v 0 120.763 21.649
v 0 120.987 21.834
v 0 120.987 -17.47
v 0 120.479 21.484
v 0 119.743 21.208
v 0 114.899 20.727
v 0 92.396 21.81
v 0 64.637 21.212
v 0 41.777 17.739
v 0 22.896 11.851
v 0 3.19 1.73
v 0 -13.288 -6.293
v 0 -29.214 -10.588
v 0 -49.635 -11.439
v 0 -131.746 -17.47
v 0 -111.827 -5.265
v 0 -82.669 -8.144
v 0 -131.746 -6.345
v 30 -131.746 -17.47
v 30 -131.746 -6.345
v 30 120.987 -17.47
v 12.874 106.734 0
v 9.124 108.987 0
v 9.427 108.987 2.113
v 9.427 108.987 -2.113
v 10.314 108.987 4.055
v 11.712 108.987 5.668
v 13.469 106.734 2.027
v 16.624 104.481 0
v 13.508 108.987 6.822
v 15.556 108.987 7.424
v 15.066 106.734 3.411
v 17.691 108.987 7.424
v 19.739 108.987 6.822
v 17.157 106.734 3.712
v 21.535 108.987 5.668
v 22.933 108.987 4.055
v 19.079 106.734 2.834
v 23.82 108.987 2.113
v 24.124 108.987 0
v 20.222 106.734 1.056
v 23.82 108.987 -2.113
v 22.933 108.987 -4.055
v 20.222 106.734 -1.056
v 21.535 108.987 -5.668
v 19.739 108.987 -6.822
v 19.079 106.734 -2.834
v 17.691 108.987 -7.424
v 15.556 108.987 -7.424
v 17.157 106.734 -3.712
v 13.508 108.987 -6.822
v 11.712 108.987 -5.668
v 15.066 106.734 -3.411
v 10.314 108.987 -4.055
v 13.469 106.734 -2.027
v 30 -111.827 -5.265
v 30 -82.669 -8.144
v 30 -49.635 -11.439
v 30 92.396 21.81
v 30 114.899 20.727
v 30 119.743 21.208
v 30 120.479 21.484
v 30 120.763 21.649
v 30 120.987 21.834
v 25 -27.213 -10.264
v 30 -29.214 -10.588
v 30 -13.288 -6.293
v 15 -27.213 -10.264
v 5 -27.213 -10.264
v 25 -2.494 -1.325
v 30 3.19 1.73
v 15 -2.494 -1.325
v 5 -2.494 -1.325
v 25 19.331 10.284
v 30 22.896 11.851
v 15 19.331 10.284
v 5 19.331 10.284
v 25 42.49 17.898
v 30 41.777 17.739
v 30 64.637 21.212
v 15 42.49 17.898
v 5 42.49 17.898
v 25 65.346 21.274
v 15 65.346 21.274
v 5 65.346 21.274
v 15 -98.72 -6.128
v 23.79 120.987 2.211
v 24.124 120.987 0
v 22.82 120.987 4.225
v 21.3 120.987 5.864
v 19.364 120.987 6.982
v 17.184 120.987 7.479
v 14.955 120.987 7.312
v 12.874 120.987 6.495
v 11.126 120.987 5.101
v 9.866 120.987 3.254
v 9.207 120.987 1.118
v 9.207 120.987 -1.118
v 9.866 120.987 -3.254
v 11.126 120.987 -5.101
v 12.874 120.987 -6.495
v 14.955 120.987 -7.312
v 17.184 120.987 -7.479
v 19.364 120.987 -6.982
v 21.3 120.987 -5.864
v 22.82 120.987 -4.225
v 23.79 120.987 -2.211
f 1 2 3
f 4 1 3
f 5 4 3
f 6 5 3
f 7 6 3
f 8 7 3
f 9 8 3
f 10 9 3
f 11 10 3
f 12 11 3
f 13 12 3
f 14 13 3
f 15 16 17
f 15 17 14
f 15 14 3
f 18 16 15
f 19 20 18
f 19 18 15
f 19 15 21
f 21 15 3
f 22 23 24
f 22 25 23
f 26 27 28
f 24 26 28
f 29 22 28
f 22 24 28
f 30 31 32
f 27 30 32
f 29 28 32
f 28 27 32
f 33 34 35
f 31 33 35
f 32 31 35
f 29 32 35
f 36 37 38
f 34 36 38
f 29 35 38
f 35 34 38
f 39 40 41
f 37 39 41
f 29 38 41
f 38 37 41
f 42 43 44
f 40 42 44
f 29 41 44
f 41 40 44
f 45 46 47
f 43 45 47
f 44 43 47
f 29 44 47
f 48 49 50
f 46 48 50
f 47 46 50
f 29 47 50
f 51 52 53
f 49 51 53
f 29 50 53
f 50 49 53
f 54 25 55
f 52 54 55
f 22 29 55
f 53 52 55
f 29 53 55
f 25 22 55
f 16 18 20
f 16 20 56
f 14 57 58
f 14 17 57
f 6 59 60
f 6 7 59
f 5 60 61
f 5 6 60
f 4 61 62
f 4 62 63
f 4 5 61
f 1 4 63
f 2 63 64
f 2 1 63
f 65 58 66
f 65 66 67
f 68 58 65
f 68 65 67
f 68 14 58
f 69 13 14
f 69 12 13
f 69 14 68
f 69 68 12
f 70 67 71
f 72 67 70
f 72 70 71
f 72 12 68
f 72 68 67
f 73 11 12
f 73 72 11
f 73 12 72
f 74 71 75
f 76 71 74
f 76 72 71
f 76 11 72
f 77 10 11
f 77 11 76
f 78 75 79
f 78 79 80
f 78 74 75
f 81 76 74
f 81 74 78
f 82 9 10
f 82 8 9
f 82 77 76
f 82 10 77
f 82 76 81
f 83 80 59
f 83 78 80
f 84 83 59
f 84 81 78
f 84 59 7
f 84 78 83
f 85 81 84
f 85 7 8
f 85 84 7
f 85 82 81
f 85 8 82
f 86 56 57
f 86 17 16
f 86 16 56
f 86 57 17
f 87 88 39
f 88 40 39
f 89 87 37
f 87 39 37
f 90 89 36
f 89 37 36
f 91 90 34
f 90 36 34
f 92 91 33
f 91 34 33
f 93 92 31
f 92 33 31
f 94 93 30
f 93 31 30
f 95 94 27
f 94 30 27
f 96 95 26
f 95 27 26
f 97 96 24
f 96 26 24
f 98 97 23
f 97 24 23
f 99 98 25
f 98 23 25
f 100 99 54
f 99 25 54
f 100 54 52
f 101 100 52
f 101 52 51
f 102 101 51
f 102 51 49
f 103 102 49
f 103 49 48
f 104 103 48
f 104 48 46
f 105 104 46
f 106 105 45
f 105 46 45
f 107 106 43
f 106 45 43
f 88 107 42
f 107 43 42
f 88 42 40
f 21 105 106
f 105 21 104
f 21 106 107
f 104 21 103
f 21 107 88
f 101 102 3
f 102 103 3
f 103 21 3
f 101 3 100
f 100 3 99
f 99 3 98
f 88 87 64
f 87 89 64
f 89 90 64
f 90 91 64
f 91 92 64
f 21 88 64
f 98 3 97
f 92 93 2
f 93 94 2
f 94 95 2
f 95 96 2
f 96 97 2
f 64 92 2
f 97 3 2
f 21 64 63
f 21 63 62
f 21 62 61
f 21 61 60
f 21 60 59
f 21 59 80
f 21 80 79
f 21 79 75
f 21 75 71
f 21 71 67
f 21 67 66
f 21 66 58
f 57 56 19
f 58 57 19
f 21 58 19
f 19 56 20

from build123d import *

# Parameters (mm, degrees)
F1_DEPTH = 30
F3_D     = 15
F3_DEPTH = 12
F3_TIP   = 4.5064546427


with BuildPart() as f1:
    # F0 (on Right) → F1 (new body)
    with BuildSketch(Plane.YZ):
        with BuildLine():
            add(Edge.make_bspline(
                [(-131.7461282015, -6.3447873108), (-123.3728835246, -5.5048995417), (-101.6398772811, -3.324945792), (-23.878808121, -20.0188151505), (17.9272379867, 14.4389849512), (65.4591264475, 22.4432346678), (95.6973111303, 22.0628570773), (119.1290489196, 19.9651290611), (120.9872886539, 21.8335315585)],
                knots=[0, 0, 0, 0, 0.0724770959, 0.1881164636, 0.2848952315, 0.3749576445, 0.4526977925, 0.5148099141, 0.5148099141, 0.5148099141, 0.5148099141], degree=3))
            Line((-131.7461282015, -6.3447873108), (-131.7461282015, -17.4702424556))
            Line((-131.7461282015, -17.4702424556), (120.9872886539, -17.4702424556))
            Line((120.9872886539, -17.4702424556), (120.9872886539, 21.8335315585))
        make_face()
    extrude(amount=F1_DEPTH)

    # F3
    with Locations(Plane(origin=(0, 120.9872886539, 0), x_dir=(-1, 0, 0), z_dir=(0, 1, 0))):
        with Locations((-16.6236571968, 0)):
            Hole(F3_D / 2, depth=F3_DEPTH)
            with Locations((0, 0, -(F3_DEPTH + F3_TIP / 2))):  # 118° drill point
                Cone(0, F3_D / 2, F3_TIP, mode=Mode.SUBTRACT)


solid = f1.part
